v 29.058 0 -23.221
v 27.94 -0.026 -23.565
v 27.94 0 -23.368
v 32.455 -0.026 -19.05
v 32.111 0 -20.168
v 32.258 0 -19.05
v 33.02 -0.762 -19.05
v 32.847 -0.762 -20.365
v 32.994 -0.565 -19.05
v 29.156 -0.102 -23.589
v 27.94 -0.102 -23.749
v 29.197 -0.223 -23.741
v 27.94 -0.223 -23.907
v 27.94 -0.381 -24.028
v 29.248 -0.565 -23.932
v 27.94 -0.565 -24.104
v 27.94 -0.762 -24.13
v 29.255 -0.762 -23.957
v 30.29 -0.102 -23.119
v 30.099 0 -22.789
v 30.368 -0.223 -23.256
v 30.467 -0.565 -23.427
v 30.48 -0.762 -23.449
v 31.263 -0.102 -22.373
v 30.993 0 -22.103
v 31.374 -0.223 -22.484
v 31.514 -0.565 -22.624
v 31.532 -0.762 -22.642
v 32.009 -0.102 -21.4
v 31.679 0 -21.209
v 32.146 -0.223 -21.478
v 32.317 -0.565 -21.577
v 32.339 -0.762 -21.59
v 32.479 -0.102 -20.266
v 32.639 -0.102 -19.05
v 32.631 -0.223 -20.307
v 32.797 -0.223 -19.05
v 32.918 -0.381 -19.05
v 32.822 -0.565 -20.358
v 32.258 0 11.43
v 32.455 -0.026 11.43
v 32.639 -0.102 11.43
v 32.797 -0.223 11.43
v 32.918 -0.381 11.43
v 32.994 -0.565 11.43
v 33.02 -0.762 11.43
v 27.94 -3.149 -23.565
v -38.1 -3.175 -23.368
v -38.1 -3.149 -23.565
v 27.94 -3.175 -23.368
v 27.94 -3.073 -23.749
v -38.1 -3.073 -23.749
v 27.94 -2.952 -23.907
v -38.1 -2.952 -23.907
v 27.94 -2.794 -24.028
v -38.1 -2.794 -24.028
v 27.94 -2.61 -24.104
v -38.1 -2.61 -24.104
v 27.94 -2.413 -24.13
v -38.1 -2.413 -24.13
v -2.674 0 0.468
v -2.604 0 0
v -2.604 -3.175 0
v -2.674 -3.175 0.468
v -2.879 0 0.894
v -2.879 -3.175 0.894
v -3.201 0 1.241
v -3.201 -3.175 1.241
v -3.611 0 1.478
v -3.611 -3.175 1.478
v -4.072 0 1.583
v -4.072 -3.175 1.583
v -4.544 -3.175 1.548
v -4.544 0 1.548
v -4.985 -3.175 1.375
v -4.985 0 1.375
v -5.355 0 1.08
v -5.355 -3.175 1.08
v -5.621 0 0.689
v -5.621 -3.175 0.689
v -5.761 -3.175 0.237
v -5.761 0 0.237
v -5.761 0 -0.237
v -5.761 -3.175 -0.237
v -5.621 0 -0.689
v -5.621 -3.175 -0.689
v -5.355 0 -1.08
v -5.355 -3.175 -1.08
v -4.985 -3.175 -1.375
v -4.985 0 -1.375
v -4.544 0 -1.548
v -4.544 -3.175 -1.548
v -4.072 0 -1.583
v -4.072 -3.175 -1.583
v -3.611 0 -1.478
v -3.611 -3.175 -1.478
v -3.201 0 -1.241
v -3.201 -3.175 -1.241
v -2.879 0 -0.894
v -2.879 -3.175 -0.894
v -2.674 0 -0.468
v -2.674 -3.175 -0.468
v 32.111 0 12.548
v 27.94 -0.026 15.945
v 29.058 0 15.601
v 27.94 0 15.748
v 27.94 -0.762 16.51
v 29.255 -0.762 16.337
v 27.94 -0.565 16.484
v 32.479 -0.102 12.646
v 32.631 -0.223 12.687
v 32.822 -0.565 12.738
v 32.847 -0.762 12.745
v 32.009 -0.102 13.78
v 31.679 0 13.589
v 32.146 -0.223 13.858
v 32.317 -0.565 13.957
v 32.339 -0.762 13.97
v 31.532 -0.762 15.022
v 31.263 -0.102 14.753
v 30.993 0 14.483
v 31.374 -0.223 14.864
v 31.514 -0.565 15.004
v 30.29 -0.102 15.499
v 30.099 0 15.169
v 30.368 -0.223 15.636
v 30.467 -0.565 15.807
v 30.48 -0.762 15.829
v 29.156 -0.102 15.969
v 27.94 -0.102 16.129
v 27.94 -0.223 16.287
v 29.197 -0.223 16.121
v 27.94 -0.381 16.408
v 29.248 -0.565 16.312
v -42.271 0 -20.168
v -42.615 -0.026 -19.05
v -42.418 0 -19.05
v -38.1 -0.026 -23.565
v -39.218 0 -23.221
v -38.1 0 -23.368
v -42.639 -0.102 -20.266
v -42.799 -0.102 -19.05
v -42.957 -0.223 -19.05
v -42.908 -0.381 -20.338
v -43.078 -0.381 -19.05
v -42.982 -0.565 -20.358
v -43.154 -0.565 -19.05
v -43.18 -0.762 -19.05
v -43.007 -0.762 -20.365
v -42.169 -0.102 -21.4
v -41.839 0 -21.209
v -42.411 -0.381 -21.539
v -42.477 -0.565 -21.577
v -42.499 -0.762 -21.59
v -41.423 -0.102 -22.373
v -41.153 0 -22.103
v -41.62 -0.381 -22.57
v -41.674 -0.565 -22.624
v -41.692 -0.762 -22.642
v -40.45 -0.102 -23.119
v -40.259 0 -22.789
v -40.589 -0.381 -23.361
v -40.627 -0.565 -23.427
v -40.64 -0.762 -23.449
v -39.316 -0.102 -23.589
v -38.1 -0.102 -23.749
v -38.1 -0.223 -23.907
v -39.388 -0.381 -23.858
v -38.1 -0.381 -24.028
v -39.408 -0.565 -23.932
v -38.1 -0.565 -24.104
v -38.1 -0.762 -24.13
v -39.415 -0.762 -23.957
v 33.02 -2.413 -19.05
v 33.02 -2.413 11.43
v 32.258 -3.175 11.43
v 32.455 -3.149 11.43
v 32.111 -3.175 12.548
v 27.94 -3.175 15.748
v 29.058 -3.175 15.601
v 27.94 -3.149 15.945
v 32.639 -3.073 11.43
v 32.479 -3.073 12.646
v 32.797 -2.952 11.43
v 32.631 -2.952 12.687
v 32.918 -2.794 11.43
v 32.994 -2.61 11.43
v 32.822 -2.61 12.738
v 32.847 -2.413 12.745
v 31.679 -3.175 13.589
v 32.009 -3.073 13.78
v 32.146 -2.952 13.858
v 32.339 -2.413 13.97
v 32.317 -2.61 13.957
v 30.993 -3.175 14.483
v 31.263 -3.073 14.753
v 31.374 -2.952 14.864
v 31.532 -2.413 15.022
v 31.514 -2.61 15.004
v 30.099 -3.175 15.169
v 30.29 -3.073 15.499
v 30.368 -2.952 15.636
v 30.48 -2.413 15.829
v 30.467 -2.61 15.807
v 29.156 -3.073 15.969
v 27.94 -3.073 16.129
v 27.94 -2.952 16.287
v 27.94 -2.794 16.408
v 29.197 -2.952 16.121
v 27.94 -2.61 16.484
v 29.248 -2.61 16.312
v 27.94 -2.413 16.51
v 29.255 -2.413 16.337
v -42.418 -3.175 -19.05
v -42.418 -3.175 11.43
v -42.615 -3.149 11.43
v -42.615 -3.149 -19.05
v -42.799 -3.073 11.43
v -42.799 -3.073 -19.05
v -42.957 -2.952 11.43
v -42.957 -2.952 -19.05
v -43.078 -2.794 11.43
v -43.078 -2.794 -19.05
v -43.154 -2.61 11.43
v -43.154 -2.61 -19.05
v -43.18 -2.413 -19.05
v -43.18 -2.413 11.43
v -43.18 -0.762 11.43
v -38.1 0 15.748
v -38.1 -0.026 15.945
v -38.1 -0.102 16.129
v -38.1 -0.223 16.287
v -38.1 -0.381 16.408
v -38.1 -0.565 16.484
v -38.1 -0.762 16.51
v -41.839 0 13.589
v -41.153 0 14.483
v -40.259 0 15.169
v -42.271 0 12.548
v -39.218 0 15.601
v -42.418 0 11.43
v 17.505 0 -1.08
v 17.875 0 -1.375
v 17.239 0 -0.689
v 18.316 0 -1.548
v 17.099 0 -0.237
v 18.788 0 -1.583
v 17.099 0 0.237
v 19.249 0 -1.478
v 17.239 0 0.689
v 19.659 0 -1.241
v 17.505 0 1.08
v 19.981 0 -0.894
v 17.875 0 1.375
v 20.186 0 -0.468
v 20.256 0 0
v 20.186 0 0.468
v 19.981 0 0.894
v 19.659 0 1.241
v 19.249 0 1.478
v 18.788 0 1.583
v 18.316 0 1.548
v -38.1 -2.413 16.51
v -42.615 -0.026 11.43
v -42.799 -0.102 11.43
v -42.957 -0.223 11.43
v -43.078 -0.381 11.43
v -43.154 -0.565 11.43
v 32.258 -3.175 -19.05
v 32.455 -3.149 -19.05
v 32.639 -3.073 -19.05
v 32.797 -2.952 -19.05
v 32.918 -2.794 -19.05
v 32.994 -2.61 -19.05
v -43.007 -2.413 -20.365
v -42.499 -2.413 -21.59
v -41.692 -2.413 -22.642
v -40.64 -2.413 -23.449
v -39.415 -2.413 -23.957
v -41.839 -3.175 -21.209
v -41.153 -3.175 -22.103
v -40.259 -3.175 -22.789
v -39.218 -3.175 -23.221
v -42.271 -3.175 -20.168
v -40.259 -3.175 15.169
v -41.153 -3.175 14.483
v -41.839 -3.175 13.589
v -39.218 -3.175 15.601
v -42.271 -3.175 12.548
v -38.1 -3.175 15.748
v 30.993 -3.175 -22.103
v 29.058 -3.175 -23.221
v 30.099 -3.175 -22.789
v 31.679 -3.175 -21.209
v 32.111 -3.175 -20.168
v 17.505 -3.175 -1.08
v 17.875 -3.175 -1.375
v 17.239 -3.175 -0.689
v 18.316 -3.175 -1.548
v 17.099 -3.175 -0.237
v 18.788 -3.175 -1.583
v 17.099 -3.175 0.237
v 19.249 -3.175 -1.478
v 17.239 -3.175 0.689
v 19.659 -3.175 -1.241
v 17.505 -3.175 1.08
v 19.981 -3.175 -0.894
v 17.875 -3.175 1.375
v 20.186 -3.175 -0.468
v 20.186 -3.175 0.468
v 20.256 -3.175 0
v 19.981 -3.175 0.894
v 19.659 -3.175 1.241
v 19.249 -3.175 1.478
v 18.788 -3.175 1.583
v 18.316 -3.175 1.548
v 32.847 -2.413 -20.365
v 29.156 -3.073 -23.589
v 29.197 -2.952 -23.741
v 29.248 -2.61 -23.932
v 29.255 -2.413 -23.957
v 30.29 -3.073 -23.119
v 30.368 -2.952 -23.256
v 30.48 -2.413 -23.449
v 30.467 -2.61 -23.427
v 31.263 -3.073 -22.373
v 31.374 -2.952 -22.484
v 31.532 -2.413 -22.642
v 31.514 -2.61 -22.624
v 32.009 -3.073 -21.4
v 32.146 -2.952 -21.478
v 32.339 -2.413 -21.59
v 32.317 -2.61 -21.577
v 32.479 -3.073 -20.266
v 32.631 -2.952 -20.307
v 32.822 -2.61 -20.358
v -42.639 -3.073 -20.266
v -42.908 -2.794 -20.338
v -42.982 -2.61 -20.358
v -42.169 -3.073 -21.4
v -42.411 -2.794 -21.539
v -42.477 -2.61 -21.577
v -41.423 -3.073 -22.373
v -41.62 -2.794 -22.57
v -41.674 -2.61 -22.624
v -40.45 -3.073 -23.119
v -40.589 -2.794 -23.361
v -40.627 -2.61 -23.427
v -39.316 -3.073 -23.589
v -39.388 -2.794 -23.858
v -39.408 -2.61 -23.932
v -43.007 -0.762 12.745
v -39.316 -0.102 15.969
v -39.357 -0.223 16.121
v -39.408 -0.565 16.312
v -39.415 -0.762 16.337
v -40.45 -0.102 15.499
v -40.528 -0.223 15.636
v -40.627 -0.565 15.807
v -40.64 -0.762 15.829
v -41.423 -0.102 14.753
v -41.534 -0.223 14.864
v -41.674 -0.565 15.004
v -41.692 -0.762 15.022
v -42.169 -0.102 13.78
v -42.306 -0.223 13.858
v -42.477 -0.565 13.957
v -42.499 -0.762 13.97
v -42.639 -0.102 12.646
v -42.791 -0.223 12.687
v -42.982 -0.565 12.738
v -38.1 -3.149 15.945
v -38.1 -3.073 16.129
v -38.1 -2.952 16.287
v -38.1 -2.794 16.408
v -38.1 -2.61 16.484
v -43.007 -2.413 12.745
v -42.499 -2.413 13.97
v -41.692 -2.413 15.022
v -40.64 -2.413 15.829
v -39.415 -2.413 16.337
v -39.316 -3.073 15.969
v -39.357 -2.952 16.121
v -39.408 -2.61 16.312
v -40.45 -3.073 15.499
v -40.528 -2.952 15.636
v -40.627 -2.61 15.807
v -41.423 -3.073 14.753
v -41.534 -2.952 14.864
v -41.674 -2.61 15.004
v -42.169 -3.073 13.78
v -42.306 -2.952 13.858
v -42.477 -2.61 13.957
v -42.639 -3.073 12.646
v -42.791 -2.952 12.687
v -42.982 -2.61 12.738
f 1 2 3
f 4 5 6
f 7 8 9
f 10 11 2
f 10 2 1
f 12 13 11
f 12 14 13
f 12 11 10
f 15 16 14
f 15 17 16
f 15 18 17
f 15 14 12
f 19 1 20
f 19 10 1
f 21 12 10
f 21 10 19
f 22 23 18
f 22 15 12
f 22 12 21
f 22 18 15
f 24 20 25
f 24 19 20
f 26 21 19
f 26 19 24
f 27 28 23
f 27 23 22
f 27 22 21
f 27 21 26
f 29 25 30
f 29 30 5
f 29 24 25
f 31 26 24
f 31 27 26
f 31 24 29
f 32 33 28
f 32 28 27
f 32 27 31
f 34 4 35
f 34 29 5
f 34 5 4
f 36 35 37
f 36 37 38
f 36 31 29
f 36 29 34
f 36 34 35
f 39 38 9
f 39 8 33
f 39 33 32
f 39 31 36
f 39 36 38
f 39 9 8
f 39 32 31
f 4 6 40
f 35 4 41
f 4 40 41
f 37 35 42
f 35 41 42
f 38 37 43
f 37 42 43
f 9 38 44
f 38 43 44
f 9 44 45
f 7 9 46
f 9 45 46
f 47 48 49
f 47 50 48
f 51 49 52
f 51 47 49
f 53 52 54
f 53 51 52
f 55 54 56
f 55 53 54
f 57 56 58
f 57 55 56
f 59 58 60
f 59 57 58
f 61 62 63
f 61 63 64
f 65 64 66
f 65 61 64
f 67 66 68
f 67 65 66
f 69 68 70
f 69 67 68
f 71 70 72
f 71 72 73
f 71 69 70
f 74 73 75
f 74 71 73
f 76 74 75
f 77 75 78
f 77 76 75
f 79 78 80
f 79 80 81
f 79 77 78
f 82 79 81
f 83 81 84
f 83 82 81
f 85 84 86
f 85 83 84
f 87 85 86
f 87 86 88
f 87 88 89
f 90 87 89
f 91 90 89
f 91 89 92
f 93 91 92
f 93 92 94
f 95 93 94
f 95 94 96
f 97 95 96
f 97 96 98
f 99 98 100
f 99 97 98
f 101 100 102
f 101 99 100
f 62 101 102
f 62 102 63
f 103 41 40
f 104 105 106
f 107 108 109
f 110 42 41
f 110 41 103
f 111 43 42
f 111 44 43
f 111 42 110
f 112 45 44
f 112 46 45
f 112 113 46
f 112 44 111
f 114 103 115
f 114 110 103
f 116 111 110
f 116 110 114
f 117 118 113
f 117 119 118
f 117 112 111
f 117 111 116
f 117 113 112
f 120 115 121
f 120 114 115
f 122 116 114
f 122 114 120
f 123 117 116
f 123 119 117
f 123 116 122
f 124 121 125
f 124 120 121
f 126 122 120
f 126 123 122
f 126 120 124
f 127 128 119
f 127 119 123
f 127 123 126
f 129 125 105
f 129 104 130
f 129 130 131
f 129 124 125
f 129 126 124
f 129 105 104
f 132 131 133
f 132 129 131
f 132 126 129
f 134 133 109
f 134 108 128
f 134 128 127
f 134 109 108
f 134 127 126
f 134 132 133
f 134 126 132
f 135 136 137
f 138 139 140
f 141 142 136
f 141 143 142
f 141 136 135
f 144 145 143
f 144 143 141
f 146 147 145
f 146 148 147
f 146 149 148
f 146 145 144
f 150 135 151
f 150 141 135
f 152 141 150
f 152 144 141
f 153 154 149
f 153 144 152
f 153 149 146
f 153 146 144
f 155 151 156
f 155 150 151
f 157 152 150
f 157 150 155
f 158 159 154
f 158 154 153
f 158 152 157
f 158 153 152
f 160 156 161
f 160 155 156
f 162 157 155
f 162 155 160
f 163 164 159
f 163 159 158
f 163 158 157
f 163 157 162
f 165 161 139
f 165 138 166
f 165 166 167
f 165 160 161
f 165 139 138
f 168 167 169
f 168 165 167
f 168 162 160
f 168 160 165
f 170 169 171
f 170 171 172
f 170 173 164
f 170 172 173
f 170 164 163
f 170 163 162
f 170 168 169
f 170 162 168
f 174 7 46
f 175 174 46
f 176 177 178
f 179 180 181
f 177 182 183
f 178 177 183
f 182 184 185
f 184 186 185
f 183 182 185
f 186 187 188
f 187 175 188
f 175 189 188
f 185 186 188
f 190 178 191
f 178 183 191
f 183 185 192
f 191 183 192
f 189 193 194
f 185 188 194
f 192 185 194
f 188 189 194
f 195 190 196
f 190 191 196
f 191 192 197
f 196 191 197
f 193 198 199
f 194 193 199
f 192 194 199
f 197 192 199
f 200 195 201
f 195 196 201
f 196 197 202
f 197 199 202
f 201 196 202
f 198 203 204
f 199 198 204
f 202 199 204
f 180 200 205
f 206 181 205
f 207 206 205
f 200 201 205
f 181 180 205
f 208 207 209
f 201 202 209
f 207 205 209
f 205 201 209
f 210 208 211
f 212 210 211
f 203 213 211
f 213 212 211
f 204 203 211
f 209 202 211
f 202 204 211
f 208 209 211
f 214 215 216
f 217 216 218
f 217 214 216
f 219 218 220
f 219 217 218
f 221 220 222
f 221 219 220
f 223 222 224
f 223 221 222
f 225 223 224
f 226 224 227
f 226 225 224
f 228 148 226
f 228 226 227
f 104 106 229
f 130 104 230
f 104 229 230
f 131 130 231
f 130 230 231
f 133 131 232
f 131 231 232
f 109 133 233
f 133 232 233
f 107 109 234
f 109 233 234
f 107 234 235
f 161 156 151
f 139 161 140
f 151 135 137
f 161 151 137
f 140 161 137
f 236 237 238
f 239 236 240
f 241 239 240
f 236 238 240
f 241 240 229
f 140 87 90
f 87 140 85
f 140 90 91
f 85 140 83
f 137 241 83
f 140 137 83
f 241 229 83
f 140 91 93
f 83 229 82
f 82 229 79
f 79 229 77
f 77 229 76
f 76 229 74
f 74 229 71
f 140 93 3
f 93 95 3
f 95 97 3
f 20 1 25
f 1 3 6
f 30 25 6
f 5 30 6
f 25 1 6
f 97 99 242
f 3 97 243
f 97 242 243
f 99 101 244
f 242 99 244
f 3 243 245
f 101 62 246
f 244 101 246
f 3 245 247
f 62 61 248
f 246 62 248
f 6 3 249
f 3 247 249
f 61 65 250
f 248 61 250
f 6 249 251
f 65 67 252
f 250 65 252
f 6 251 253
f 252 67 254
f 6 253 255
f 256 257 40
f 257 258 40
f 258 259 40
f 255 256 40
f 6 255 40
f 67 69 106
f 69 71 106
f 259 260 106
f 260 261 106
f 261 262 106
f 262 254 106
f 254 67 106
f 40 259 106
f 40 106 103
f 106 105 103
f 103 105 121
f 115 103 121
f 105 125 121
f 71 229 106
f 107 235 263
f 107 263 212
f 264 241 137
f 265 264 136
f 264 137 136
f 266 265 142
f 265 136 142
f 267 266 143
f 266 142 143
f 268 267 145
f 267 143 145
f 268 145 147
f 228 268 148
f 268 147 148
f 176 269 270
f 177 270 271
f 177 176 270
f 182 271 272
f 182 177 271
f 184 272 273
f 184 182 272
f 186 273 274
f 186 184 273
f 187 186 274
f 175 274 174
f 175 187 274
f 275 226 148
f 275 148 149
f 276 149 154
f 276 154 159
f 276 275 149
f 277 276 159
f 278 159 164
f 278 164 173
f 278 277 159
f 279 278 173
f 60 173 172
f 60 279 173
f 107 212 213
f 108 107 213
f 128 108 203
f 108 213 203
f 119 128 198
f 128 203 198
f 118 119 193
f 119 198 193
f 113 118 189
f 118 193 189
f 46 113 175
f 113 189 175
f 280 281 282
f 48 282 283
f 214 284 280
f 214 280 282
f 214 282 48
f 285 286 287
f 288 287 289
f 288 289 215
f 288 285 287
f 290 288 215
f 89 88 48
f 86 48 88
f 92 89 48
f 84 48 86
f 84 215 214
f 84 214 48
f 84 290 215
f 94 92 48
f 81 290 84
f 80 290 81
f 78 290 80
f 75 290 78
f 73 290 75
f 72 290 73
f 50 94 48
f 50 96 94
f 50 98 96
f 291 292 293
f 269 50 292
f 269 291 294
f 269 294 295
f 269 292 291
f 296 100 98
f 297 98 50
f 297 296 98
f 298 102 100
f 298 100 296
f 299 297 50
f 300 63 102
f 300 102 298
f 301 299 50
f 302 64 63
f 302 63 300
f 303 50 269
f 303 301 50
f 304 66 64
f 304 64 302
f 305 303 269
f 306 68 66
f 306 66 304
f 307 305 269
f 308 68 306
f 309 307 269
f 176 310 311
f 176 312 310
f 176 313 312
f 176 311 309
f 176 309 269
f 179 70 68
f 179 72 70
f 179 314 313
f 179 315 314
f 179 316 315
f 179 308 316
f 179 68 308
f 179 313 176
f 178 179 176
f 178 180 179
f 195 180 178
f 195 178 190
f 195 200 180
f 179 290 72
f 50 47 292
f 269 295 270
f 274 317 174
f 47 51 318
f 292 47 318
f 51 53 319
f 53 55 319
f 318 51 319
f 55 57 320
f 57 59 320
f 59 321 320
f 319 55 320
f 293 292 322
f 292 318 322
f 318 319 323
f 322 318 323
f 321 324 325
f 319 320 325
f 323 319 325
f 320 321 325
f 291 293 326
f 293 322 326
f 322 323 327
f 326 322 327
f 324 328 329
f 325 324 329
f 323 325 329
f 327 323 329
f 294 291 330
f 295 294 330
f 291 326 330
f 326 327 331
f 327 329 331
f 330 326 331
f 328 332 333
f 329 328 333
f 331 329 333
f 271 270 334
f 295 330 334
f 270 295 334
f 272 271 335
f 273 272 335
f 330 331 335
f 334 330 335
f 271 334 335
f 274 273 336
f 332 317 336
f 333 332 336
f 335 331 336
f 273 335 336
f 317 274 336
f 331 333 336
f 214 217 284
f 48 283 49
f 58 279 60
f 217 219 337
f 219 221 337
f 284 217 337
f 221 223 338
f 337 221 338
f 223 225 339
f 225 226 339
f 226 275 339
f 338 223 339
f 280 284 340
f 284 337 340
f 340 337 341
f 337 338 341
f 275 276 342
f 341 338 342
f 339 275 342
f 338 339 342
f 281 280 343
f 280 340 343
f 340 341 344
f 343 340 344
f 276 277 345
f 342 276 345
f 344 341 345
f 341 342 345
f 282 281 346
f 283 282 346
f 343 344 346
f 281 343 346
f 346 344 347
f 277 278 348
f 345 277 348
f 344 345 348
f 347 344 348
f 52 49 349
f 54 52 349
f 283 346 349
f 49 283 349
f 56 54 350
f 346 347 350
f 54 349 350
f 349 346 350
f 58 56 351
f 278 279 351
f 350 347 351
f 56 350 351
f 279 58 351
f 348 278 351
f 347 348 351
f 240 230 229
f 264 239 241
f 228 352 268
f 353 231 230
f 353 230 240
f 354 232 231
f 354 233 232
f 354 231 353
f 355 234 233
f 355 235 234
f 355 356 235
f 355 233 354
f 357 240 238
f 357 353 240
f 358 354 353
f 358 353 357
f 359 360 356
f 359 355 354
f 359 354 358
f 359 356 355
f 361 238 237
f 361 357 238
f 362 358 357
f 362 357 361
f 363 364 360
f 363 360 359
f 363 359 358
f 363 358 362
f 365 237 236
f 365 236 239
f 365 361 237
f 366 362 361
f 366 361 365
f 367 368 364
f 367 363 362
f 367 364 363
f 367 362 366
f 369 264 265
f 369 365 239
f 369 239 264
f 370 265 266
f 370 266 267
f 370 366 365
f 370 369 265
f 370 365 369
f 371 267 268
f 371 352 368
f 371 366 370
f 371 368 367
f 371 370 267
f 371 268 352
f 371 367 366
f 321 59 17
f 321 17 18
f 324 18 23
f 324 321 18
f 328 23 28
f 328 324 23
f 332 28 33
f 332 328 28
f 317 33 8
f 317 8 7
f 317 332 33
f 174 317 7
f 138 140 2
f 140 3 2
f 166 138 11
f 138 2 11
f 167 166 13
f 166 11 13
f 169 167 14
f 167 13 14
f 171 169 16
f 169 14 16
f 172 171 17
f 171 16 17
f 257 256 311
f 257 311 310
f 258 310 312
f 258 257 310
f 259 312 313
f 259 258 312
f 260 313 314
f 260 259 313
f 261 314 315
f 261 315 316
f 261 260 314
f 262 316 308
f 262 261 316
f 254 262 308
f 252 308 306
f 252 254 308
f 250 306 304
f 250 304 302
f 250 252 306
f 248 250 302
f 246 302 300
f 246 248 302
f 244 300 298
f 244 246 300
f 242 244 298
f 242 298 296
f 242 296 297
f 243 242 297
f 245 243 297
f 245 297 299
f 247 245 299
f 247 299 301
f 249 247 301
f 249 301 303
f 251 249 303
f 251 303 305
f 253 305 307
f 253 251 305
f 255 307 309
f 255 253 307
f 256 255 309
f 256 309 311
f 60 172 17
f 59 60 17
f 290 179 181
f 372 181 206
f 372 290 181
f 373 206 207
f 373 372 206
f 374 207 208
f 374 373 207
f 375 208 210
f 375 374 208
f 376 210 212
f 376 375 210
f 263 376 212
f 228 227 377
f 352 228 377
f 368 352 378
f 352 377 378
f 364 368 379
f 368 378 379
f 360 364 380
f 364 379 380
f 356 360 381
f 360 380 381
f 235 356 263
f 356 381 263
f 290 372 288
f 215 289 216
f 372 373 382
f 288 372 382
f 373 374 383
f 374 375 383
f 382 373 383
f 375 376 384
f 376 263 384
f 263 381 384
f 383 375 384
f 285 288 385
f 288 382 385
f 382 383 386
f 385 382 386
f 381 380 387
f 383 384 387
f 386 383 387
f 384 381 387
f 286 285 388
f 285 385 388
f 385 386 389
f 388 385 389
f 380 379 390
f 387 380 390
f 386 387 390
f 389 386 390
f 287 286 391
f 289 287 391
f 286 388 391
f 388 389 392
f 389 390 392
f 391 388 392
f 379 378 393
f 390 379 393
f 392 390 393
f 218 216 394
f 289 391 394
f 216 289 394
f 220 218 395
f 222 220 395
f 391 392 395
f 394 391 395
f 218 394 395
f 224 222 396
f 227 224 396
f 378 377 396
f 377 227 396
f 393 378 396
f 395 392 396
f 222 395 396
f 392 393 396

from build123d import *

# Parameters (mm, degrees)
F0_W     = 76.2
F0_H     = 40.64
F0_R     = 1.5875
F1_DEPTH = 3.175
F2_R     = 5.08
F3_R     = 0.762


# Not quite as in the source:
# - a feature names something its author has since deleted; it is built from what else it names


with BuildPart() as f1:
    # F0 (on Front) → F1 (new body)
    with BuildSketch(Plane.XZ):
        with Locations((-5.08, -3.81)):
            Rectangle(F0_W, F0_H)
        with Locations((-4.191, 0)):
            Circle(F0_R, mode=Mode.SUBTRACT)
        with Locations((18.669, 0)):
            Circle(F0_R, mode=Mode.SUBTRACT)
    extrude(amount=F1_DEPTH)

    # F2
    f2_edges = [f1.edges().sort_by_distance(p)[0] for p in [
        (-43.18, -1.5875, -24.13),
        (33.02, -1.5875, 16.51),
        (33.02, -1.5875, -24.13),
        (-43.18, -1.5875, 16.51),
    ]]
    fillet(f2_edges, radius=F2_R)

    # F3
    f3_edges = [f1.edges().sort_by_distance(p)[0] for p in [
        (-5.08, 0, -24.13),
        (-5.08, -3.175, -24.13),
        (-43.18, -3.175, -3.81),
        (-43.18, 0, -3.81),
        (-41.692102, 0, -22.642102),
        (31.532102, 0, -22.642102),
        (33.02, 0, -3.81),
        (-41.692102, 0, 15.022102),
        (31.532102, 0, 15.022102),
        (-5.08, 0, 16.51),
        (-41.692102, -3.175, -22.642102),
        (31.532102, -3.175, -22.642102),
        (33.02, -3.175, -3.81),
        (-41.692102, -3.175, 15.022102),
        (31.532102, -3.175, 15.022102),
        (-5.08, -3.175, 16.51),
    ]]
    fillet(f3_edges, radius=F3_R)


solid = f1.part
